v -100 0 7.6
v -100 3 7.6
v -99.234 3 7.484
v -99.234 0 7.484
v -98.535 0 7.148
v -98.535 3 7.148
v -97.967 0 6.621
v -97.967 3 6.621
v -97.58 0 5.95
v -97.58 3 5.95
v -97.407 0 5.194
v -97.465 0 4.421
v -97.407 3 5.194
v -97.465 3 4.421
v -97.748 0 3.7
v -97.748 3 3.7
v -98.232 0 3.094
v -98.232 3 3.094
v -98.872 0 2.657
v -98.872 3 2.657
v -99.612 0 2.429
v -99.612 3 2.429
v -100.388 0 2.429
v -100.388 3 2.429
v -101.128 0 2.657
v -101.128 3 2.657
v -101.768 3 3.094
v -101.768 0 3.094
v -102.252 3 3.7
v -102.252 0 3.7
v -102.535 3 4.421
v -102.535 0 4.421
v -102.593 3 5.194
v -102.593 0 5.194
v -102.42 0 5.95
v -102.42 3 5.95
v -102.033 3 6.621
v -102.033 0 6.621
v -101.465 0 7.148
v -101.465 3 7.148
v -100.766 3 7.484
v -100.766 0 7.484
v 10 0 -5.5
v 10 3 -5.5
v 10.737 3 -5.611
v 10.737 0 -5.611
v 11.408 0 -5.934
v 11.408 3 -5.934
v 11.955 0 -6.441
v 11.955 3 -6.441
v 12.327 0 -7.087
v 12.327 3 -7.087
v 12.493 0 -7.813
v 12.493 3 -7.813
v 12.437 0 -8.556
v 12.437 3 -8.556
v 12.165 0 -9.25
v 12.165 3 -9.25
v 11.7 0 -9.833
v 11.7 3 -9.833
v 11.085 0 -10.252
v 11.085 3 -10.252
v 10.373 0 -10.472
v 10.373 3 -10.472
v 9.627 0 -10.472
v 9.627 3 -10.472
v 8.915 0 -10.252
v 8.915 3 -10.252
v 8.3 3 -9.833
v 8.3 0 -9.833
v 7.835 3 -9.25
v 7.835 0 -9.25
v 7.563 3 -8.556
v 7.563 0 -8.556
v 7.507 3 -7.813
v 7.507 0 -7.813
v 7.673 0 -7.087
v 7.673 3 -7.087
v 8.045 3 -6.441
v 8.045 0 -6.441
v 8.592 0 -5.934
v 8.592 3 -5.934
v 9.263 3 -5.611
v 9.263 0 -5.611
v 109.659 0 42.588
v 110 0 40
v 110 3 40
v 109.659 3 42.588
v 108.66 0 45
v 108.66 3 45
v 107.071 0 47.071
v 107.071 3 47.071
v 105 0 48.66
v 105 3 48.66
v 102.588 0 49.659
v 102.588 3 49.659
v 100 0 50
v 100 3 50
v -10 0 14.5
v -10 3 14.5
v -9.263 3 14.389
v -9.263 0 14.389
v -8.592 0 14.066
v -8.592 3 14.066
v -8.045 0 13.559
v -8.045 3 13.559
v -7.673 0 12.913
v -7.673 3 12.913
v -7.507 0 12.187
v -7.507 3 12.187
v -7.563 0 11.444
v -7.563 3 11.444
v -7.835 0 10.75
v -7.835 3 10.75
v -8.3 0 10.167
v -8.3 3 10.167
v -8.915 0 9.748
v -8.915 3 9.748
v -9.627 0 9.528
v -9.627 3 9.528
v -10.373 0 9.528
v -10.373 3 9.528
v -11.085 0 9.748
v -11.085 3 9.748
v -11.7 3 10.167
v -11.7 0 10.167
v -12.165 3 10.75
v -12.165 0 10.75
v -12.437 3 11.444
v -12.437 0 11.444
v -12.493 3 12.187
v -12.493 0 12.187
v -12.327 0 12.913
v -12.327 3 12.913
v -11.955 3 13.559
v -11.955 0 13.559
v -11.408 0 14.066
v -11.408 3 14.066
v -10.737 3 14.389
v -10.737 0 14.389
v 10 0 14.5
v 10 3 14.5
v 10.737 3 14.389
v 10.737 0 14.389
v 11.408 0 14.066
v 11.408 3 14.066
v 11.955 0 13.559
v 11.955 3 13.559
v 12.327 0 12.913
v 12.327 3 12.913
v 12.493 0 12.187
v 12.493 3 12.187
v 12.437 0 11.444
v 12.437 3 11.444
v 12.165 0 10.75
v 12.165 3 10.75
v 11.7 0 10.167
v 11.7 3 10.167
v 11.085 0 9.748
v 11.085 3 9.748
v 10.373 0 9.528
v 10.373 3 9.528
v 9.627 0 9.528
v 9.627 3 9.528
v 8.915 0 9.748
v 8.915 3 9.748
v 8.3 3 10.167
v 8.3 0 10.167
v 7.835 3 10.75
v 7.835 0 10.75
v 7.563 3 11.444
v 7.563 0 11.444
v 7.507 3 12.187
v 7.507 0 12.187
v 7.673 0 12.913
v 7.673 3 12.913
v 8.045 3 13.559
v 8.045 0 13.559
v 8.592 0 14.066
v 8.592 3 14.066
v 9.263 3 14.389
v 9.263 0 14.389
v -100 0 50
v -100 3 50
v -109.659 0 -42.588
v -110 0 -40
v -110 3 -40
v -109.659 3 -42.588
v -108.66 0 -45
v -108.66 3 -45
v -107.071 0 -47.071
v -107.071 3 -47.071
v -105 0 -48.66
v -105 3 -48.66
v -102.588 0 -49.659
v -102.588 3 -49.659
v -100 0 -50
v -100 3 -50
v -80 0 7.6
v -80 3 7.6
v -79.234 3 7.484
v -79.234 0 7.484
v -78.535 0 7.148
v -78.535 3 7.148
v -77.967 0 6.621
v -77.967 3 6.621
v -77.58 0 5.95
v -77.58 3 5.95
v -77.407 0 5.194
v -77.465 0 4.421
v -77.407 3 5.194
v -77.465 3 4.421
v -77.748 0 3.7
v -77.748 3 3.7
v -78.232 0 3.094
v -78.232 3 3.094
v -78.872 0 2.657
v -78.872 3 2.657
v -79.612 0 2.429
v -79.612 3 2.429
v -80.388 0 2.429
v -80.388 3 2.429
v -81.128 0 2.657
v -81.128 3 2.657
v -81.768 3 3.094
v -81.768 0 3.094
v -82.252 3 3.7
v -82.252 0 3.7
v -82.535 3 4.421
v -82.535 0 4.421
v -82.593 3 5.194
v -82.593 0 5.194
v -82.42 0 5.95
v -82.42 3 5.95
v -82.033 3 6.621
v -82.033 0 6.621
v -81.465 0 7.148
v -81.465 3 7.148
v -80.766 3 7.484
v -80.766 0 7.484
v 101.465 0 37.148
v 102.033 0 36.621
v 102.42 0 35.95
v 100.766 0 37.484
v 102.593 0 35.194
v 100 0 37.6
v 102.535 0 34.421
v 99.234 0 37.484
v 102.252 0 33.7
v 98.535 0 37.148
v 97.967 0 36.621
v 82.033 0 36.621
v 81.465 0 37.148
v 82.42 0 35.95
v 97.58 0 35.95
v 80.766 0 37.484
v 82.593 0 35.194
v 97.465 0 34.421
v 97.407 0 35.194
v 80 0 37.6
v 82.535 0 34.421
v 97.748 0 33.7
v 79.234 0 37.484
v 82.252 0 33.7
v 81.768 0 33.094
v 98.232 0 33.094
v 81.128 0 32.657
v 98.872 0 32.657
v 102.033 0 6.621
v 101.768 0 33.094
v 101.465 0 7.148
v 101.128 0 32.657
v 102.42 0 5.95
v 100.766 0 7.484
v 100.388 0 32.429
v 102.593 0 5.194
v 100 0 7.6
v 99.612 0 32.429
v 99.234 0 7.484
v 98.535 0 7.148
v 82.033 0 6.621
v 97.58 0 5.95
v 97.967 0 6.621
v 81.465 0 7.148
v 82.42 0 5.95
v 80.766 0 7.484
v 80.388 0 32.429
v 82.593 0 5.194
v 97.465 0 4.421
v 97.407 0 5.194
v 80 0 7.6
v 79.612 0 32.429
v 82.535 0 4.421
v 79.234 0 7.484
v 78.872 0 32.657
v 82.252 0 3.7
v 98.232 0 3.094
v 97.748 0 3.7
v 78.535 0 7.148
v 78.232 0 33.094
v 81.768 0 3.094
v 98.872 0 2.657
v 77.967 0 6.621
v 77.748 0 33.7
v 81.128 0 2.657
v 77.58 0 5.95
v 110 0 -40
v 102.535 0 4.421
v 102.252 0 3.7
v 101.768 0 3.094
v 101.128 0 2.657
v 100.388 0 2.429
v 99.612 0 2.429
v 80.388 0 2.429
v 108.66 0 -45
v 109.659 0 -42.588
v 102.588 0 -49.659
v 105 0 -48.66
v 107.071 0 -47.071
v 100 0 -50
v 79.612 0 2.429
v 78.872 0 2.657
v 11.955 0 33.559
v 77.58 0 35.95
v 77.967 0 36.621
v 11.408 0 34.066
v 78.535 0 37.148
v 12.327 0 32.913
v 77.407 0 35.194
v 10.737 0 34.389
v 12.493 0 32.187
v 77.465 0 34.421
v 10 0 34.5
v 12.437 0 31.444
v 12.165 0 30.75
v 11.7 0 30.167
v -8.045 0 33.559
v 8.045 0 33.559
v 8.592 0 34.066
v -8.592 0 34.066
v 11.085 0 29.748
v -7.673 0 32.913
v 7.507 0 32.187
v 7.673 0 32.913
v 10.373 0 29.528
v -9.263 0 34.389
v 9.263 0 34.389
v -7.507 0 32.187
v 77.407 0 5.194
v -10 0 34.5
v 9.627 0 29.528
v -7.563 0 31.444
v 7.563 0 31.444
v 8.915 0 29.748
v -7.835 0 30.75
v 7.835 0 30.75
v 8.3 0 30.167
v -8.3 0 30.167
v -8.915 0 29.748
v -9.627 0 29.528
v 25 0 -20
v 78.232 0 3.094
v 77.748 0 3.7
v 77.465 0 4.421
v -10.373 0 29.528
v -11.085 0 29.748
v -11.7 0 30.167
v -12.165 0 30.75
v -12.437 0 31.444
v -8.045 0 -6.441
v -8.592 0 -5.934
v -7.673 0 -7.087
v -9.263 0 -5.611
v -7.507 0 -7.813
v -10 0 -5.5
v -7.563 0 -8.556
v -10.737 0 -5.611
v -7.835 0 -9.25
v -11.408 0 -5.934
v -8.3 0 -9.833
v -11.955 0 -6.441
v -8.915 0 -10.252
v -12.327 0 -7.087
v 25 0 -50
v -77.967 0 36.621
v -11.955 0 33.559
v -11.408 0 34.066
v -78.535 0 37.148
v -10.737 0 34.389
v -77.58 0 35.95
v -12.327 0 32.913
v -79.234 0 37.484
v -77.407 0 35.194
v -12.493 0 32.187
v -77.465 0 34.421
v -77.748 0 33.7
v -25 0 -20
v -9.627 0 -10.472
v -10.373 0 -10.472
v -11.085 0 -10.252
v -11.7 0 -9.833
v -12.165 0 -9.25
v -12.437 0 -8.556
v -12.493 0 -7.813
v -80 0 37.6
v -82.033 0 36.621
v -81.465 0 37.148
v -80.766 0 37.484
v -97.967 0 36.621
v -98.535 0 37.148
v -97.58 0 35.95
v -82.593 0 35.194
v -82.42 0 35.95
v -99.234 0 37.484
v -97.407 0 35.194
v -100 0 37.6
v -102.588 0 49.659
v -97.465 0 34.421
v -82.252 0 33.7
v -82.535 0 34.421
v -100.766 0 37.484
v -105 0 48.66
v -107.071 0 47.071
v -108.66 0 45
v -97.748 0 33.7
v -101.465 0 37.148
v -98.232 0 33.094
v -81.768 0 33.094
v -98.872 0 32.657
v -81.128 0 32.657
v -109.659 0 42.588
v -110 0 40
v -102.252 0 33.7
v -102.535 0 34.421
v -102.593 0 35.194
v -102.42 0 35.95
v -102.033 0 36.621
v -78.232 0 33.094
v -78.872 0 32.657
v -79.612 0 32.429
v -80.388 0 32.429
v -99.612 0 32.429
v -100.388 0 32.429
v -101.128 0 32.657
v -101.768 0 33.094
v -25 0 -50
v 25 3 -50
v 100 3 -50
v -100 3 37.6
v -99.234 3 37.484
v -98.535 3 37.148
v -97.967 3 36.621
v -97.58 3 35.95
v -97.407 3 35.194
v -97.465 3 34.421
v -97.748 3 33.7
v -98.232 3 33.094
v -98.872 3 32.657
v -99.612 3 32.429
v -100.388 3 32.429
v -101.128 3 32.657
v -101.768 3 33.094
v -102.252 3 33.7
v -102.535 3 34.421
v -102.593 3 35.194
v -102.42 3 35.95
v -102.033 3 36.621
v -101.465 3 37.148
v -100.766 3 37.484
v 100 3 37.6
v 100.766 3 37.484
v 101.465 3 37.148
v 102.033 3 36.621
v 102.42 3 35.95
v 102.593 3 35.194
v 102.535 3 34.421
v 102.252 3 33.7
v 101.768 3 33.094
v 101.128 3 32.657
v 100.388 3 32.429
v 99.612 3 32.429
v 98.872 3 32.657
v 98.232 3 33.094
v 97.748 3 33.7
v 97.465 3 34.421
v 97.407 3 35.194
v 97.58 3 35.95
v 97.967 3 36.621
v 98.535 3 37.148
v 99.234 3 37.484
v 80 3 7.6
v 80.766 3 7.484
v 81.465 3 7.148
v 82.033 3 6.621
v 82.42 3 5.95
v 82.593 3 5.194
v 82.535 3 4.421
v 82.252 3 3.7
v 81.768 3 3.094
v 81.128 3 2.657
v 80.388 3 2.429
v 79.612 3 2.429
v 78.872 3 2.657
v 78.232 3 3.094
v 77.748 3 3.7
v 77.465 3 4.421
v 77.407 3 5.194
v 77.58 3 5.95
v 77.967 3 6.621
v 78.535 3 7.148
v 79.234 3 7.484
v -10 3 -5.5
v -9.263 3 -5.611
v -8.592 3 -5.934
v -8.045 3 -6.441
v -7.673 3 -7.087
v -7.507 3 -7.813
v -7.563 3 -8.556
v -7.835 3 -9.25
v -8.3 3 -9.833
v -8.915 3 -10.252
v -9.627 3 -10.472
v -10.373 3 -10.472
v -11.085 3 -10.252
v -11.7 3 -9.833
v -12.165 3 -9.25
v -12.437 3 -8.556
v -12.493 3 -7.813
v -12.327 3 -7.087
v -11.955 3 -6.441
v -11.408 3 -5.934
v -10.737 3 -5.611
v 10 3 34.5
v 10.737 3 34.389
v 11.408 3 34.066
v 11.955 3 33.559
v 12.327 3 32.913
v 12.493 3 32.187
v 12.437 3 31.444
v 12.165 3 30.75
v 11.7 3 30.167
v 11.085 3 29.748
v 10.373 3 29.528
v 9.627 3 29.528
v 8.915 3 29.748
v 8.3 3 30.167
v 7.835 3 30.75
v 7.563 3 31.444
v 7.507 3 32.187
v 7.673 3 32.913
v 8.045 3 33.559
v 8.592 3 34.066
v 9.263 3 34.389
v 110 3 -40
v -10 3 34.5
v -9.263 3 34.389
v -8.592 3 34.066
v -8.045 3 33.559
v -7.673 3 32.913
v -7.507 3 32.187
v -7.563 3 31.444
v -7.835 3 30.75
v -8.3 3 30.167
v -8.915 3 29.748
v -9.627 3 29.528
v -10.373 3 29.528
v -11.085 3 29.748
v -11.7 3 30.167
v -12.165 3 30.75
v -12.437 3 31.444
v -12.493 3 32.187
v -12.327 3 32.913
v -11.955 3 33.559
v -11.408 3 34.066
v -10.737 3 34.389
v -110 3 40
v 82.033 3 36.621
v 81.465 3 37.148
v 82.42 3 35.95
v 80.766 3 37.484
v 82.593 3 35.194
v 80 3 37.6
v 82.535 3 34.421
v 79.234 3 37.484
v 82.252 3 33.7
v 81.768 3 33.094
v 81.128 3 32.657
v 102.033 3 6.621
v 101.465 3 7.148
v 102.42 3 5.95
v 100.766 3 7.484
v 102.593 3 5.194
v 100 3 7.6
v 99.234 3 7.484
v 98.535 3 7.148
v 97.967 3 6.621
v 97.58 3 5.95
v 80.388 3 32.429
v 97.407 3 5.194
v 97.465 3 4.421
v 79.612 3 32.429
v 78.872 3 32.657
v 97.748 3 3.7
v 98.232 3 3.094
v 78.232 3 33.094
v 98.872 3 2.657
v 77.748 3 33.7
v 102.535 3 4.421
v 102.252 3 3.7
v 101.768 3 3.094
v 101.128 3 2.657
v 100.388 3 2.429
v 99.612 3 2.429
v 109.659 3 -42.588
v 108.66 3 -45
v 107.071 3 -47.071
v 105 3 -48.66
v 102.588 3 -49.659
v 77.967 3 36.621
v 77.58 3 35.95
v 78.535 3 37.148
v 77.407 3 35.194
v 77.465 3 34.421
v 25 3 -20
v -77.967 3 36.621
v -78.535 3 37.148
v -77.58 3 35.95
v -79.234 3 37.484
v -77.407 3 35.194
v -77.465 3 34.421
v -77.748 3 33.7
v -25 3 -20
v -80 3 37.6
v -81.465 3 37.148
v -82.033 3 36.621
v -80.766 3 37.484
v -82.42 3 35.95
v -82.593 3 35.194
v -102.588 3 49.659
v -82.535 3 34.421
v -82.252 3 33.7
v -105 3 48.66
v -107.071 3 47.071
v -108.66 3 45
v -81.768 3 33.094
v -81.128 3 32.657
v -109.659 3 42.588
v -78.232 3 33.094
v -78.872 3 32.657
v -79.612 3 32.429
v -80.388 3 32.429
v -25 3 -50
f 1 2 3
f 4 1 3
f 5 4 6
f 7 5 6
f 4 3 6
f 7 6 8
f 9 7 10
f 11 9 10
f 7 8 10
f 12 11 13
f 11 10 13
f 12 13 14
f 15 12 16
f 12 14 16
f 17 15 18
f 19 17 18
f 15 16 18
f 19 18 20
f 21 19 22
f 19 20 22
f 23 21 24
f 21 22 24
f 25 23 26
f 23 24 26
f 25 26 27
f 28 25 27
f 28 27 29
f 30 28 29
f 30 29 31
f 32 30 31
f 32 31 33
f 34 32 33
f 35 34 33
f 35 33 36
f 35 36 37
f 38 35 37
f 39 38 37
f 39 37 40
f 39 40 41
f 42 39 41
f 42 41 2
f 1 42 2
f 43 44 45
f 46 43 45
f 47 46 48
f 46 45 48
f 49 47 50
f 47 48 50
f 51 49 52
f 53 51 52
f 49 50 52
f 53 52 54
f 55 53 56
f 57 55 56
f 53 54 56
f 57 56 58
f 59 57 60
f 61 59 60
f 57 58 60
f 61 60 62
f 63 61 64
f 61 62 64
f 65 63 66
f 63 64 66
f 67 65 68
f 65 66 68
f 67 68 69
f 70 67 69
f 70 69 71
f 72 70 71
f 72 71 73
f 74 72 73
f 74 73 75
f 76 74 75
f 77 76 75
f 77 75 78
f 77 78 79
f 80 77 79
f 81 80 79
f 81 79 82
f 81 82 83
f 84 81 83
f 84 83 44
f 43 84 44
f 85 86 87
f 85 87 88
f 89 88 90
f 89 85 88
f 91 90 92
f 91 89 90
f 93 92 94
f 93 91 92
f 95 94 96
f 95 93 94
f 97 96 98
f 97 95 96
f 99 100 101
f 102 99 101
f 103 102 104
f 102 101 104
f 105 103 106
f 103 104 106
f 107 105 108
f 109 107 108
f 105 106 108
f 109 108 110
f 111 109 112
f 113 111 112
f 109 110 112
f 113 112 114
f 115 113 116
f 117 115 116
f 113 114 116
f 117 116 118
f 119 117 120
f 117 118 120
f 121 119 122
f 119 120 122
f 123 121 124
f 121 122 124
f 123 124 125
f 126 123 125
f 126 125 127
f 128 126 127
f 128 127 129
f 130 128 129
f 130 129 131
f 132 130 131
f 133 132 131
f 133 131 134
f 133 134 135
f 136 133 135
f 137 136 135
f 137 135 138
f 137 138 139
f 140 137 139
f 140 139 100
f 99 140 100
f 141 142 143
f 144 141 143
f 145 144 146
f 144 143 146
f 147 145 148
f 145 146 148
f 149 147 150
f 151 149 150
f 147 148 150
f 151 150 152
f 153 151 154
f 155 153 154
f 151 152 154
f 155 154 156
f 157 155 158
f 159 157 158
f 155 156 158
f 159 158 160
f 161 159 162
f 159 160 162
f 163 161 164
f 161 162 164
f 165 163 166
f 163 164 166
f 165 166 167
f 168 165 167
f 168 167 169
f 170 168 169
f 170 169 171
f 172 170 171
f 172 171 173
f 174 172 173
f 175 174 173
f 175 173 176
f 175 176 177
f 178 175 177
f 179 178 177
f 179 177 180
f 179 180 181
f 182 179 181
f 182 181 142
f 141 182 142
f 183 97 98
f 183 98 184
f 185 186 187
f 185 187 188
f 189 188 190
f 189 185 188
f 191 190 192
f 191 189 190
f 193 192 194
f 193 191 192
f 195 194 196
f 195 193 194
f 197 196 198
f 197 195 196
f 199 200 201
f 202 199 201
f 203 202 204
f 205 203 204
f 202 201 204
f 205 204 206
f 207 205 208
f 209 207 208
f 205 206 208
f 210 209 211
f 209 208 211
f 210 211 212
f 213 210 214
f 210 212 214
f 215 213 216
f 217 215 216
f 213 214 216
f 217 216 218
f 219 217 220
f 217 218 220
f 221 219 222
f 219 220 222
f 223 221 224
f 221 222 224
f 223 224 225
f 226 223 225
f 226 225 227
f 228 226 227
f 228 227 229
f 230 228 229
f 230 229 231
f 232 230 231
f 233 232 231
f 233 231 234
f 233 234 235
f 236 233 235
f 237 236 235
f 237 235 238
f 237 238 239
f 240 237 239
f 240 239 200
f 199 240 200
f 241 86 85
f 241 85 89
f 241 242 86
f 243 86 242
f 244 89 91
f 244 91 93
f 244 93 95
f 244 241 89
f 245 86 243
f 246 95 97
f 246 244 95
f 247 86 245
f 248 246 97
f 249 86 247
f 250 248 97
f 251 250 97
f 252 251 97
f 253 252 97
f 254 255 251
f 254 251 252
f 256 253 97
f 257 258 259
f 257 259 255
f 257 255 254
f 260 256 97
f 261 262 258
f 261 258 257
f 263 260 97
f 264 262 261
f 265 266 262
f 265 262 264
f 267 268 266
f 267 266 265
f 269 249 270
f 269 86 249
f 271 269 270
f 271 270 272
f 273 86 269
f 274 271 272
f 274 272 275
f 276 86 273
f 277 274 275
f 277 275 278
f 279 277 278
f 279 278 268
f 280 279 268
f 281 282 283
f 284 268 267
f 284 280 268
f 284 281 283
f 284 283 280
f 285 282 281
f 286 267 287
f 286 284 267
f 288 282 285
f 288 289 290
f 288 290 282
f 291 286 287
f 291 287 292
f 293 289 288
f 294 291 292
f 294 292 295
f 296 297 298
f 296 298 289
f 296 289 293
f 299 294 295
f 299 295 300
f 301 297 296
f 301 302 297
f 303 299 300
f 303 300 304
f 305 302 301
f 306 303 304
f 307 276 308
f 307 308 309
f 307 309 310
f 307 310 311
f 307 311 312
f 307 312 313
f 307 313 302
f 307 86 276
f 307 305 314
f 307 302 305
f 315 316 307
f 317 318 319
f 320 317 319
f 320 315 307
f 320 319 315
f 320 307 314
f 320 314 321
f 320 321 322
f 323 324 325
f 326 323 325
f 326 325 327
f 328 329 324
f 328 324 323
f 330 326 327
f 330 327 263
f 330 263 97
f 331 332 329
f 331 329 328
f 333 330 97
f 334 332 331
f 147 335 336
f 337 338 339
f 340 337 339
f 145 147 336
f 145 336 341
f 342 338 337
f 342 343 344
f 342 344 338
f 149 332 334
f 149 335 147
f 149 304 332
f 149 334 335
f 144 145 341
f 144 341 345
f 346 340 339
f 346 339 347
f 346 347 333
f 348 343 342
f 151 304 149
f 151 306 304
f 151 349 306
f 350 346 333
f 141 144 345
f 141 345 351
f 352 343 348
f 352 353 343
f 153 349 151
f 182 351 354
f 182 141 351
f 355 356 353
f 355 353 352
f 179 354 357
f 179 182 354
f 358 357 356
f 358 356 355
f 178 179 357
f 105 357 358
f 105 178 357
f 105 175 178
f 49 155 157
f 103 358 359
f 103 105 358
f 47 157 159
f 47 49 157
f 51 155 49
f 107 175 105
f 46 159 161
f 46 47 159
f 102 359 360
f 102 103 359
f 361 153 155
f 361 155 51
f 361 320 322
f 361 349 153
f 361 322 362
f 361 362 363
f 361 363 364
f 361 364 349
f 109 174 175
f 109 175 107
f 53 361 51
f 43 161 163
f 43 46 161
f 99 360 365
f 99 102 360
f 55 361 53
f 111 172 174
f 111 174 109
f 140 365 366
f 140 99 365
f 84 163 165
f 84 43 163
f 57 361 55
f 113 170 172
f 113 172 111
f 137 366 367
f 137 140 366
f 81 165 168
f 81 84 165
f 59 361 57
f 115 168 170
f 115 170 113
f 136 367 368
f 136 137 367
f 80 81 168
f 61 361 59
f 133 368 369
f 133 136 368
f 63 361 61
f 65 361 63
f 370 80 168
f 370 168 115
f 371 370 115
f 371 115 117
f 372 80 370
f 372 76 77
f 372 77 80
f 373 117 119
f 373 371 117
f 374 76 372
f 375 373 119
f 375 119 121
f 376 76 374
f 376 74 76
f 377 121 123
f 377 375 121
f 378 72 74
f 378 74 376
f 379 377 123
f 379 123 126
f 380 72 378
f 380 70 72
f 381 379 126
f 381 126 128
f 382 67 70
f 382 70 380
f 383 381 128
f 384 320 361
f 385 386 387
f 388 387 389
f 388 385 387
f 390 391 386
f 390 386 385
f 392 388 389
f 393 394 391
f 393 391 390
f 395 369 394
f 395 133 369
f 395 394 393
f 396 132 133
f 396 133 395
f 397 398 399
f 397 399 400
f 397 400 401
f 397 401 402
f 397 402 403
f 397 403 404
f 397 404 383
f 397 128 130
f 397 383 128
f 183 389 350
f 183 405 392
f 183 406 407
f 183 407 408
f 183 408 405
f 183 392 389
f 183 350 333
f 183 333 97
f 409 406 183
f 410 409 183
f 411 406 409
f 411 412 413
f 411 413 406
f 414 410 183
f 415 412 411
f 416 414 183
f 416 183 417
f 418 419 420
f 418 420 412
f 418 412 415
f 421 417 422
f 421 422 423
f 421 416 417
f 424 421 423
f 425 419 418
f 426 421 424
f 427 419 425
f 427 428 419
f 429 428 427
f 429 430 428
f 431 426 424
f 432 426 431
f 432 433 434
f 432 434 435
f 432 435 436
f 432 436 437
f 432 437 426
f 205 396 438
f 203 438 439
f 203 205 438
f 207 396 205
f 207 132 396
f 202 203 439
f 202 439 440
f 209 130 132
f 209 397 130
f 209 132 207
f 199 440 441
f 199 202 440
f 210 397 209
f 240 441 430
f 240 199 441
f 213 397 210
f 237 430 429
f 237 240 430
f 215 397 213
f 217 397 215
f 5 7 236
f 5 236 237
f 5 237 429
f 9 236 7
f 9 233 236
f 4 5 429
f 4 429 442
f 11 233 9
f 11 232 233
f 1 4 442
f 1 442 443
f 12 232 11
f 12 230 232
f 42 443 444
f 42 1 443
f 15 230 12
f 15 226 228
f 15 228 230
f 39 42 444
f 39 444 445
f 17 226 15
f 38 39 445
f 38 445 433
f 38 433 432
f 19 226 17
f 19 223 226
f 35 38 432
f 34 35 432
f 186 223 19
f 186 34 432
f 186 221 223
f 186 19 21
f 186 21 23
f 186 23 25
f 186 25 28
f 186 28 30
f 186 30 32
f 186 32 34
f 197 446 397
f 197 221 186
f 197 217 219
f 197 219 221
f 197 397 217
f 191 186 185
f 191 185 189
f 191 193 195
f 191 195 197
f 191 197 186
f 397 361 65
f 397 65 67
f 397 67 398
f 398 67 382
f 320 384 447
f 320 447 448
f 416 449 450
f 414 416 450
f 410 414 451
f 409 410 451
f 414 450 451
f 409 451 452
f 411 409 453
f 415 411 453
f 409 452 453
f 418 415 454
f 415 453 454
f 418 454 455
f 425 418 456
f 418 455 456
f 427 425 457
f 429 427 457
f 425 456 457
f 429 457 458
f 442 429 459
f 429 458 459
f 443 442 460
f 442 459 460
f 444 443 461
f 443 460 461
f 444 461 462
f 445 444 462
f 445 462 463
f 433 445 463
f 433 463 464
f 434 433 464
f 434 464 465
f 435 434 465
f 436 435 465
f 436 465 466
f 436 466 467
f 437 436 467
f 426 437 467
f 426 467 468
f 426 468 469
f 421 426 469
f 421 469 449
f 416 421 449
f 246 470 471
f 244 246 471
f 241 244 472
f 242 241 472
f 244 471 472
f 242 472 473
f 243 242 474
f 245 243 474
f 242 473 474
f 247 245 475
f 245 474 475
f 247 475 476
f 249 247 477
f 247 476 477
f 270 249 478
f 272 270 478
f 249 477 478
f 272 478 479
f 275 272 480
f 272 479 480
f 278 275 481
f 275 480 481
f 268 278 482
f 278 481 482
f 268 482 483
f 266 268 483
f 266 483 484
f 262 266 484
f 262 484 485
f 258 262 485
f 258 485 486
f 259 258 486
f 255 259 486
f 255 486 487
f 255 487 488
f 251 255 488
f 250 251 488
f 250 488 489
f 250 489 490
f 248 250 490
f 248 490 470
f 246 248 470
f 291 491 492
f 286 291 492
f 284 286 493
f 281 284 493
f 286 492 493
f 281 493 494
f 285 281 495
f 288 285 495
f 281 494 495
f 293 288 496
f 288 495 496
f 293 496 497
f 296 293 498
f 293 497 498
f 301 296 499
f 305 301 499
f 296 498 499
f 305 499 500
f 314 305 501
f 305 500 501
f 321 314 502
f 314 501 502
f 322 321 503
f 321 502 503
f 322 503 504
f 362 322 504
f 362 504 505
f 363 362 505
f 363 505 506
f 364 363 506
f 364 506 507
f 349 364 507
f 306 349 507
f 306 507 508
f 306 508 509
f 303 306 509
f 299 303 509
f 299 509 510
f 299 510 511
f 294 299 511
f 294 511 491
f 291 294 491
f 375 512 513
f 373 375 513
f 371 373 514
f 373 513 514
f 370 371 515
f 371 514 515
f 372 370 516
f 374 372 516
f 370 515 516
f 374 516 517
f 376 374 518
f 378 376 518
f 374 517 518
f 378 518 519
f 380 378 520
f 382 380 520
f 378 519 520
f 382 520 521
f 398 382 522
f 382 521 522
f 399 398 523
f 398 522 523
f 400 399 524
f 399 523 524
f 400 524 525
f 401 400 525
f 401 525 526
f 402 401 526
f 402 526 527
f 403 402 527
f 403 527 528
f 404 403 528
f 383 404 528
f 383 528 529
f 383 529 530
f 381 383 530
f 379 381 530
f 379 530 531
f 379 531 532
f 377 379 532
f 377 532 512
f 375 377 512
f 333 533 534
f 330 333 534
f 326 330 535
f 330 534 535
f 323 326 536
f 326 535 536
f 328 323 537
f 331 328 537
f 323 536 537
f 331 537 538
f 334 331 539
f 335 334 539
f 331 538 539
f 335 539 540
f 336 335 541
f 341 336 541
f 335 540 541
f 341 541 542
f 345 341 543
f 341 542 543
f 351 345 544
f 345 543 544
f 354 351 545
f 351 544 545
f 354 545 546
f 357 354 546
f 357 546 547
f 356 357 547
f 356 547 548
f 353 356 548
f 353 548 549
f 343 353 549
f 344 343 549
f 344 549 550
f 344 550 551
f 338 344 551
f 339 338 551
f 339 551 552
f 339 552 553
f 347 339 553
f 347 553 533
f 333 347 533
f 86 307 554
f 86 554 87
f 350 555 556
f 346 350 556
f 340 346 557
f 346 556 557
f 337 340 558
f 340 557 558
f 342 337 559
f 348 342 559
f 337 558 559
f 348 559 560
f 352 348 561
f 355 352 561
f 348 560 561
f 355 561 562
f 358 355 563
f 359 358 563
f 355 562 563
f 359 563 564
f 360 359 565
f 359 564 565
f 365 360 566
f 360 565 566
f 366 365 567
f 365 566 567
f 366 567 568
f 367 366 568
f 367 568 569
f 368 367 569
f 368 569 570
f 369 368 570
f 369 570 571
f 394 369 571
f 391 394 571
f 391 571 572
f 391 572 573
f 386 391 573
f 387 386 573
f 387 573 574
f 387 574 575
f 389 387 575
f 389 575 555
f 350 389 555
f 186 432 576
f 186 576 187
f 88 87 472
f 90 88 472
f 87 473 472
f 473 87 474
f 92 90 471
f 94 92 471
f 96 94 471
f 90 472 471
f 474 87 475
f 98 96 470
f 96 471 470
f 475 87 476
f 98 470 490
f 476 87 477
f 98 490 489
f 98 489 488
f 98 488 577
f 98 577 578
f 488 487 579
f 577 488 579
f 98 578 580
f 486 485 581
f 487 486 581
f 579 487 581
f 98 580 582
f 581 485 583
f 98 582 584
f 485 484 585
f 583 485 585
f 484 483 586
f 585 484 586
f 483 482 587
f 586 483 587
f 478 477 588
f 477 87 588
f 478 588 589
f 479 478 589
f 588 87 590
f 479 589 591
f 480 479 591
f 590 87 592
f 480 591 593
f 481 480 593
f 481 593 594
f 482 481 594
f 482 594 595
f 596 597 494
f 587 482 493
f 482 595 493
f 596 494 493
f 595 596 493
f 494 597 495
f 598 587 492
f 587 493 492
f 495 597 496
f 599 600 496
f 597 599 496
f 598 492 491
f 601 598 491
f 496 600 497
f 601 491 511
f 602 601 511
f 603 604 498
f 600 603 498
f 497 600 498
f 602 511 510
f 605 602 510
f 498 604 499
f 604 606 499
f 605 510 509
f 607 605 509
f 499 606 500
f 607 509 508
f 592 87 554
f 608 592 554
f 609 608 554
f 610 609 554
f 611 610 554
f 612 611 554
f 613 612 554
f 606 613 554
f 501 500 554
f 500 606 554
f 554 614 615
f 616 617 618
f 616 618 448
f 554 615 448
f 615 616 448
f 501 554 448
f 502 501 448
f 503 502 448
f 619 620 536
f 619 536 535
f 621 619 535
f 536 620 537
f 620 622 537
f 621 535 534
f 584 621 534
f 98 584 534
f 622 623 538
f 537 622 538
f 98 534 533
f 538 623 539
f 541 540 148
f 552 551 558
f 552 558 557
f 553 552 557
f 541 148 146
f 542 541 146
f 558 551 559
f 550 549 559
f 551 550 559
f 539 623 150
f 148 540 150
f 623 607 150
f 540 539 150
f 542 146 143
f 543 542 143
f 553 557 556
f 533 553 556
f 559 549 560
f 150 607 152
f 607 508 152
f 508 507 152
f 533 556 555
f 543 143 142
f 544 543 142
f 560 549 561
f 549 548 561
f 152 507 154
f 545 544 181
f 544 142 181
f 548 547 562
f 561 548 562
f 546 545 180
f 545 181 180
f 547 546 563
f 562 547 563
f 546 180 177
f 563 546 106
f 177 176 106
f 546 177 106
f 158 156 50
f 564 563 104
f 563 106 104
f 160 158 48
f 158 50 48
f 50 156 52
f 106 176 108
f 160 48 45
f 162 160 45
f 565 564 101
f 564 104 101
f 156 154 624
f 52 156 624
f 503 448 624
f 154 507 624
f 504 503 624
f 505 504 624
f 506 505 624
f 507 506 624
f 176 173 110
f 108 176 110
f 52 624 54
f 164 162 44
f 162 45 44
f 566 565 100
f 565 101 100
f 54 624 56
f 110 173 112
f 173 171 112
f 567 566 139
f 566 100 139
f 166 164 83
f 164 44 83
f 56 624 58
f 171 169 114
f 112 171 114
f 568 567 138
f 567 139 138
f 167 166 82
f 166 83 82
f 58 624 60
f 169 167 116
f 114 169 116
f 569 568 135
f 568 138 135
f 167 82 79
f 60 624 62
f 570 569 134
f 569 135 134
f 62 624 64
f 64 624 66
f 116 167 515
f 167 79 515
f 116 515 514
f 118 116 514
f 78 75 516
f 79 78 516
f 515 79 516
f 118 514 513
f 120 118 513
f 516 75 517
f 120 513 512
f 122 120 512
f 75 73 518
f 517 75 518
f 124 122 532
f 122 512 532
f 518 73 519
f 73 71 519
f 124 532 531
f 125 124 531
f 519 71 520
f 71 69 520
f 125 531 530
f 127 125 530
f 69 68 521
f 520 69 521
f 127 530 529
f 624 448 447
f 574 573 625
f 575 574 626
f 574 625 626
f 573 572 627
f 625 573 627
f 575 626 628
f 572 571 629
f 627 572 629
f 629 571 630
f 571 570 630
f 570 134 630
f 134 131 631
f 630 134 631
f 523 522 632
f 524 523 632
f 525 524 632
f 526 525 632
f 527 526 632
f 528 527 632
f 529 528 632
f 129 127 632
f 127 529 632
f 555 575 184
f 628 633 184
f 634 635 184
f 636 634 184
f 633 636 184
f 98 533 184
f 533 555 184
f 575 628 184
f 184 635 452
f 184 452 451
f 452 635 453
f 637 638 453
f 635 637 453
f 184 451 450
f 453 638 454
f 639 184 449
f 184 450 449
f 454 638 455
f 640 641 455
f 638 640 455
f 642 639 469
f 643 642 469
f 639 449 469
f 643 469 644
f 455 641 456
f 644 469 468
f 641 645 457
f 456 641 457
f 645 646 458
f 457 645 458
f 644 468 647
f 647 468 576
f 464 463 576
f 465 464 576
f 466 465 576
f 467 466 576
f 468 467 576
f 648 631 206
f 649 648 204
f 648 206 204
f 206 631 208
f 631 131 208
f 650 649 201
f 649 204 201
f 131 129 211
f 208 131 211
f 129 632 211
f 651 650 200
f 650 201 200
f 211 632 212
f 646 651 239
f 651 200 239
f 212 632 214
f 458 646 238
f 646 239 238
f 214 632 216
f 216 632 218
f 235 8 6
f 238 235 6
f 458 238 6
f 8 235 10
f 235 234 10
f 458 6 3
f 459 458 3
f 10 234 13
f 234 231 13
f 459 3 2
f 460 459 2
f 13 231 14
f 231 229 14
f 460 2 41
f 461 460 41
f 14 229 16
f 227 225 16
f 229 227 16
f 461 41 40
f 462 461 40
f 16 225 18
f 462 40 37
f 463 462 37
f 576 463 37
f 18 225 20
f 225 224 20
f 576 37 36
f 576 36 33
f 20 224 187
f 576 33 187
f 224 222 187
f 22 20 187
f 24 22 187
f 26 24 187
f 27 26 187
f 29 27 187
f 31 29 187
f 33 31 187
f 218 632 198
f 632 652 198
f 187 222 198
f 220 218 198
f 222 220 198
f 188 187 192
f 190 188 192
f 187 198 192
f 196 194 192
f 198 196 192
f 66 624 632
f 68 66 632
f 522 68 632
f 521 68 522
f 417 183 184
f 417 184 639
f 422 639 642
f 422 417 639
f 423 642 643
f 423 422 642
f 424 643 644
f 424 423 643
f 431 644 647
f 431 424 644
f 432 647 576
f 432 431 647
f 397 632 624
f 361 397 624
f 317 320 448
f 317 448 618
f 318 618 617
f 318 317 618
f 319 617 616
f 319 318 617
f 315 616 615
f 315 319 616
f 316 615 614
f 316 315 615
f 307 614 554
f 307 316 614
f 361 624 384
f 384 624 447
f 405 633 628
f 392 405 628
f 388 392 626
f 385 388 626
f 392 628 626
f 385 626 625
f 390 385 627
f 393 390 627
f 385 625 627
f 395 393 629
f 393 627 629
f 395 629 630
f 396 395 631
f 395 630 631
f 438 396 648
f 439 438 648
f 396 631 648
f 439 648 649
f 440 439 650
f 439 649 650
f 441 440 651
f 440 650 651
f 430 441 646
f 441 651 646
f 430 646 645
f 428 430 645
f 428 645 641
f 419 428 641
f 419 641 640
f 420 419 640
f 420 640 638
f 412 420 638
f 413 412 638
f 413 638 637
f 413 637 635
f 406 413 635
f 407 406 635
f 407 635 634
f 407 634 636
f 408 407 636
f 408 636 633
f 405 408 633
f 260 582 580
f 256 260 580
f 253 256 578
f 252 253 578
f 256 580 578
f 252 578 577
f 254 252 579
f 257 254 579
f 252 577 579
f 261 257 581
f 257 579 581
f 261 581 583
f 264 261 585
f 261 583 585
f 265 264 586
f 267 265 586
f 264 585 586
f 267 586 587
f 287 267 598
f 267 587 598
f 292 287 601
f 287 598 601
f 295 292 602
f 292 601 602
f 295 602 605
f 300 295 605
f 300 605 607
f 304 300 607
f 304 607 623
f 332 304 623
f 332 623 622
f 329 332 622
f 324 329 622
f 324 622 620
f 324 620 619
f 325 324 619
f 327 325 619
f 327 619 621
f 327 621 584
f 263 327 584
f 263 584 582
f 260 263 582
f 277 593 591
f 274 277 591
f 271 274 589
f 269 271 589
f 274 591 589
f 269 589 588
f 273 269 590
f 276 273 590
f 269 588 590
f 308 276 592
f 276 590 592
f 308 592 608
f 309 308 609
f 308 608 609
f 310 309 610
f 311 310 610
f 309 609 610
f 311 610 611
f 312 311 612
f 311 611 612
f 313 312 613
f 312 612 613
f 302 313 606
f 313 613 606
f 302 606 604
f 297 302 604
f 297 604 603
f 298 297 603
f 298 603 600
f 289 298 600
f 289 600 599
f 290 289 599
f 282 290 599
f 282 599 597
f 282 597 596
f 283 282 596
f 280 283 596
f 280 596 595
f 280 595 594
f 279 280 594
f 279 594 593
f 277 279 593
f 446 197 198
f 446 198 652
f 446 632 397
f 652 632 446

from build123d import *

# Parameters (mm, degrees)
EXTRUDE_268_DEPTH      = 3
SKETCH_2_W             = 50
SKETCH_2_H             = 30
CUT_EXTRUDE_486_DEPTH  = 121.867696263
SKETCH_3_R             = 2.5
CUT_EXTRUDE_744_DEPTH  = 121.867696263
SKETCH_4_R             = 2.6
CUT_EXTRUDE_1056_DEPTH = 121.867696263


with BuildPart() as part:
    # 草图1 → Extrude 268 (new body)
    with BuildSketch(Plane(origin=(0, 0, 0), x_dir=(1, 0, 0), z_dir=(0, 1, 0))):
        with BuildLine():
            Line((-100, 50), (100, 50))
            ThreePointArc((100, 50), (107.071067812, 47.071067812), (110, 40))
            Line((110, 40), (110, -40))
            ThreePointArc((110, -40), (107.071067812, -47.071067812), (100, -50))
            Line((100, -50), (-100, -50))
            ThreePointArc((-100, -50), (-107.071067812, -47.071067812), (-110, -40))
            Line((-110, -40), (-110, 40))
            ThreePointArc((-110, 40), (-107.071067812, 47.071067812), (-100, 50))
        make_face()
    extrude(amount=EXTRUDE_268_DEPTH)

    # 草图2 → Cut-Extrude 486 (cut, through all)
    with BuildSketch(Plane(origin=(0, 3, 0), x_dir=(1, 0, 0), z_dir=(0, 1, 0))):
        with Locations((0, 35)):
            Rectangle(SKETCH_2_W, SKETCH_2_H)
    extrude(amount=-CUT_EXTRUDE_486_DEPTH, mode=Mode.SUBTRACT)

    # 草图3 → Cut-Extrude 744 (cut, through all)
    with BuildSketch(Plane(origin=(0, 3, 0), x_dir=(1, 0, 0), z_dir=(0, 1, 0))):
        with Locations(Location((10, 8, 0), (0, 0, 270))):
            Circle(SKETCH_3_R)
        with Locations(Location((10, -12, 0), (0, 0, 270))):
            Circle(SKETCH_3_R)
        with Locations(Location((10, -32, 0), (0, 0, 270))):
            Circle(SKETCH_3_R)
        with Locations(Location((-10, -32, 0), (0, 0, 270))):
            Circle(SKETCH_3_R)
        with Locations(Location((-10, -12, 0), (0, 0, 270))):
            Circle(SKETCH_3_R)
        with Locations(Location((-10, 8, 0), (0, 0, 270))):
            Circle(SKETCH_3_R)
    extrude(amount=-CUT_EXTRUDE_744_DEPTH, mode=Mode.SUBTRACT)

    # 草图4 → Cut-Extrude 1056 (cut, through all)
    with BuildSketch(Plane(origin=(0, 3, 0), x_dir=(1, 0, 0), z_dir=(0, 1, 0))):
        with Locations(Location((100, -35, 0), (0, 0, 270))):
            Circle(SKETCH_4_R)
        with Locations(Location((80, -35, 0), (0, 0, 270))):
            Circle(SKETCH_4_R)
        with Locations(Location((100, -5, 0), (0, 0, 270))):
            Circle(SKETCH_4_R)
        with Locations(Location((80, -5, 0), (0, 0, 270))):
            Circle(SKETCH_4_R)
        with Locations(Location((-100, -35, 0), (0, 0, 270))):
            Circle(SKETCH_4_R)
        with Locations(Location((-100, -5, 0), (0, 0, 270))):
            Circle(SKETCH_4_R)
        with Locations(Location((-80, -35, 0), (0, 0, 270))):
            Circle(SKETCH_4_R)
        with Locations(Location((-80, -5, 0), (0, 0, 270))):
            Circle(SKETCH_4_R)
    extrude(amount=-CUT_EXTRUDE_1056_DEPTH, mode=Mode.SUBTRACT)


solid = part.part
